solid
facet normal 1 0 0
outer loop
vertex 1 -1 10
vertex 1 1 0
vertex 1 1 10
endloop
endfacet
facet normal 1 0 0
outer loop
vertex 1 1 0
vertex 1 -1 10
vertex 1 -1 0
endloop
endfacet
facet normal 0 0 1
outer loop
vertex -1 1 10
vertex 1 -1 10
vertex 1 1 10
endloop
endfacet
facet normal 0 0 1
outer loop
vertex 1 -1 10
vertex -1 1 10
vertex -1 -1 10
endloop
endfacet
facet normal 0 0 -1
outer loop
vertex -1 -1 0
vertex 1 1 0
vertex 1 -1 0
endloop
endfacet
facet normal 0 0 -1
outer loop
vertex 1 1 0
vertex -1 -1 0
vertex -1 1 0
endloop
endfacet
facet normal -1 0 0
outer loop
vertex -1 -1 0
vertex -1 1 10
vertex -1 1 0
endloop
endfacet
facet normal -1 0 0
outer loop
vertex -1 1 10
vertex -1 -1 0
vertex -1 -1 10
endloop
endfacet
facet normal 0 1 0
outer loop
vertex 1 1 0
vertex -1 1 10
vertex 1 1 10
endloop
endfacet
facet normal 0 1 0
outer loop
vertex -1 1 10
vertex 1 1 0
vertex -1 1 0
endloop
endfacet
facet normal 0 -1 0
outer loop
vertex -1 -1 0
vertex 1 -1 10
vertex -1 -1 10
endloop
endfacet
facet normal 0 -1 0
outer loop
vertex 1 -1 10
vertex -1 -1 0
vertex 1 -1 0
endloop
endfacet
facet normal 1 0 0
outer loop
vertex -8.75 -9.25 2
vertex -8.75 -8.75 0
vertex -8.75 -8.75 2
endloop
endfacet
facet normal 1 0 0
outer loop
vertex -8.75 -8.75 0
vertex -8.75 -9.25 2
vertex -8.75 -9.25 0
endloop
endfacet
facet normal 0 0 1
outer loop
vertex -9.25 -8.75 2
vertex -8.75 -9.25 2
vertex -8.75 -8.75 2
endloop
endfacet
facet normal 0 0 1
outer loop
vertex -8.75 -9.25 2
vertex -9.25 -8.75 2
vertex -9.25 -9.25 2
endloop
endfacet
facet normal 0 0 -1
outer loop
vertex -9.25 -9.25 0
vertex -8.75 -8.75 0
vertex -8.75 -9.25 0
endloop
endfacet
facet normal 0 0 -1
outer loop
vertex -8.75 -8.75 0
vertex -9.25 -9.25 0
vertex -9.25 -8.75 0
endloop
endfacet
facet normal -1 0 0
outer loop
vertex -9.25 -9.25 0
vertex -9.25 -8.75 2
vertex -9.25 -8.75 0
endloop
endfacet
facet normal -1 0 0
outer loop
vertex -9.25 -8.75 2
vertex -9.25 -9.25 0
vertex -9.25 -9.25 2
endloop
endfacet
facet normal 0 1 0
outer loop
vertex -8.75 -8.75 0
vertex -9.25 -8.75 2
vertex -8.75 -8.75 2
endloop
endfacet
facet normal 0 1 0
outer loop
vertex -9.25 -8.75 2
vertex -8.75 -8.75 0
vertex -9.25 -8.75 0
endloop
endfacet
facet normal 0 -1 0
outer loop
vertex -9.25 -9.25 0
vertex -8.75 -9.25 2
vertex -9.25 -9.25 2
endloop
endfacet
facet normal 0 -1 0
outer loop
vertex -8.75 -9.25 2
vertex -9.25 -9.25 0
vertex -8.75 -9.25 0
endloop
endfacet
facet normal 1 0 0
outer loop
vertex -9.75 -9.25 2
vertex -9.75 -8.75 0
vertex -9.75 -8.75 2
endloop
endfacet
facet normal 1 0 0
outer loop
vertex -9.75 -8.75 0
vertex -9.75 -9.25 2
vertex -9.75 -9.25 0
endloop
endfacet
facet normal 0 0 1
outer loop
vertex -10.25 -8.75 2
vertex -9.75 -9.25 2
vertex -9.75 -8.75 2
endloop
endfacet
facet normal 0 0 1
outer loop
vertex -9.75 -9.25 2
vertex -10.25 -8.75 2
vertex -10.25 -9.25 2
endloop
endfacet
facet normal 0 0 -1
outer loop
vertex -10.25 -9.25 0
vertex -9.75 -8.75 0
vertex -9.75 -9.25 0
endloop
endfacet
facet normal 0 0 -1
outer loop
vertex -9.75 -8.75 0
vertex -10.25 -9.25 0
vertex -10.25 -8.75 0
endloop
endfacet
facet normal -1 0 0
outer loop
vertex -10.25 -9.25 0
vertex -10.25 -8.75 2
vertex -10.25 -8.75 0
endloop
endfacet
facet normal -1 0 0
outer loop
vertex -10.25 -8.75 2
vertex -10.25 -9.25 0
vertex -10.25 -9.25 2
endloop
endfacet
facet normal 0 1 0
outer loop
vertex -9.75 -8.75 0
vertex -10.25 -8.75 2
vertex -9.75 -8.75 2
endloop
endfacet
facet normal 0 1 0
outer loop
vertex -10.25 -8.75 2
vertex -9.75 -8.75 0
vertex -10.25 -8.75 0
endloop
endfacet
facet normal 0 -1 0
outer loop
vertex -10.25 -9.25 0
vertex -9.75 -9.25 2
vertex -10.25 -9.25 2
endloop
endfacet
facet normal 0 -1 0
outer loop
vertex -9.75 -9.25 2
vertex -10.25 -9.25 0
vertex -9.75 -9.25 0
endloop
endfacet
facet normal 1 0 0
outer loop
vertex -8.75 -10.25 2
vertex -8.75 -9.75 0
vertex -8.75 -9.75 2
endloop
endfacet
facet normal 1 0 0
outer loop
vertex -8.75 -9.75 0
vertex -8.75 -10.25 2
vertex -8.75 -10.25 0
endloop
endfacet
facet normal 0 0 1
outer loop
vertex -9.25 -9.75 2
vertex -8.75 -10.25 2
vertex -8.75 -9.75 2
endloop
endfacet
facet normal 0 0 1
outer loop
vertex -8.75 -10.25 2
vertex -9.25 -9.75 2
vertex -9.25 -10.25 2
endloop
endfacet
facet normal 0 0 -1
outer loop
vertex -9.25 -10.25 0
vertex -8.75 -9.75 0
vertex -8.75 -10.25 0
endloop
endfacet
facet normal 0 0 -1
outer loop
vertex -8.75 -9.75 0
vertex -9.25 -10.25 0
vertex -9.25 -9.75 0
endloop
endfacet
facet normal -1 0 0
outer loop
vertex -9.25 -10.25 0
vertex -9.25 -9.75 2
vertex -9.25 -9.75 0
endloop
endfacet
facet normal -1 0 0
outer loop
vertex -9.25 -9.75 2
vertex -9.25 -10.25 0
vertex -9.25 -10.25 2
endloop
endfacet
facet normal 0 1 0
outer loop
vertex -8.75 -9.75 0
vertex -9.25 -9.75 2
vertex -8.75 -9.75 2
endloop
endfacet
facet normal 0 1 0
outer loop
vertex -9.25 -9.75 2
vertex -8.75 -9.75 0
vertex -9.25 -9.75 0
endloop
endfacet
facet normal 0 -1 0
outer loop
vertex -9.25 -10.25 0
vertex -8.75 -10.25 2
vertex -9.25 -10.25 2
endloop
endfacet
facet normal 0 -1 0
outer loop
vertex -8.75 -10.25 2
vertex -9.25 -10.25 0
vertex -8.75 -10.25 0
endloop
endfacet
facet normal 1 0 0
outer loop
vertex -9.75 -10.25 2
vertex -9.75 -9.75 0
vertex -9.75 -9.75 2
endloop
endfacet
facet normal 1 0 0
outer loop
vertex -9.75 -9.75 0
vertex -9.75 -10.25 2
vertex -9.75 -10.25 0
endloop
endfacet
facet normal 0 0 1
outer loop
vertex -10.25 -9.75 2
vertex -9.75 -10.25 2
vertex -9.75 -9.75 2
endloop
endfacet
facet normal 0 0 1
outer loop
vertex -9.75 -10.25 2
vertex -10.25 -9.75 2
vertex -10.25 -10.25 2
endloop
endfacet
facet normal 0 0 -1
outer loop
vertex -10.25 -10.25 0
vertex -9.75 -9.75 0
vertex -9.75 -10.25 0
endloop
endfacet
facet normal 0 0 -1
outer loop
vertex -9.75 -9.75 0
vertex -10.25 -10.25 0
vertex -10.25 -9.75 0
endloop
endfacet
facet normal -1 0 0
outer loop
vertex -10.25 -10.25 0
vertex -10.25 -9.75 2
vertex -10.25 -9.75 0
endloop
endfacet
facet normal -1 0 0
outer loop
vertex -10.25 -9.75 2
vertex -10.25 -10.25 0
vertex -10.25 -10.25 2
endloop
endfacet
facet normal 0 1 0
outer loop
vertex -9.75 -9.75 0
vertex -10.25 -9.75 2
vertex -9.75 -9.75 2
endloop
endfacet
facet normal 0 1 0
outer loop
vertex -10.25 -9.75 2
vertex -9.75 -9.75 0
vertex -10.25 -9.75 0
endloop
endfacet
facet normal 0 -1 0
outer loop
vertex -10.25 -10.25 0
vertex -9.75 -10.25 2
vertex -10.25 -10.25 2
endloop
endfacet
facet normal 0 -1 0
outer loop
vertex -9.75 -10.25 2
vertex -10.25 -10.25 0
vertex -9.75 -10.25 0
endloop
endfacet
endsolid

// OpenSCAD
translate([0, 0, 5]) color([0,1,0,0.9]) cube([2, 2, 10], center=true);
translate([-9, -9, 1]) color([1,0,0]) cube([0.5, 0.5, 2], center=true);
translate([-10, -9, 1]) color([1,0,0]) cube([0.5, 0.5, 2], center=true);
translate([-9, -10, 1]) color([1,0,0]) cube([0.5, 0.5, 2], center=true);
translate([-10, -10, 1]) color([1,0,0]) cube([0.5, 0.5, 2], center=true);
